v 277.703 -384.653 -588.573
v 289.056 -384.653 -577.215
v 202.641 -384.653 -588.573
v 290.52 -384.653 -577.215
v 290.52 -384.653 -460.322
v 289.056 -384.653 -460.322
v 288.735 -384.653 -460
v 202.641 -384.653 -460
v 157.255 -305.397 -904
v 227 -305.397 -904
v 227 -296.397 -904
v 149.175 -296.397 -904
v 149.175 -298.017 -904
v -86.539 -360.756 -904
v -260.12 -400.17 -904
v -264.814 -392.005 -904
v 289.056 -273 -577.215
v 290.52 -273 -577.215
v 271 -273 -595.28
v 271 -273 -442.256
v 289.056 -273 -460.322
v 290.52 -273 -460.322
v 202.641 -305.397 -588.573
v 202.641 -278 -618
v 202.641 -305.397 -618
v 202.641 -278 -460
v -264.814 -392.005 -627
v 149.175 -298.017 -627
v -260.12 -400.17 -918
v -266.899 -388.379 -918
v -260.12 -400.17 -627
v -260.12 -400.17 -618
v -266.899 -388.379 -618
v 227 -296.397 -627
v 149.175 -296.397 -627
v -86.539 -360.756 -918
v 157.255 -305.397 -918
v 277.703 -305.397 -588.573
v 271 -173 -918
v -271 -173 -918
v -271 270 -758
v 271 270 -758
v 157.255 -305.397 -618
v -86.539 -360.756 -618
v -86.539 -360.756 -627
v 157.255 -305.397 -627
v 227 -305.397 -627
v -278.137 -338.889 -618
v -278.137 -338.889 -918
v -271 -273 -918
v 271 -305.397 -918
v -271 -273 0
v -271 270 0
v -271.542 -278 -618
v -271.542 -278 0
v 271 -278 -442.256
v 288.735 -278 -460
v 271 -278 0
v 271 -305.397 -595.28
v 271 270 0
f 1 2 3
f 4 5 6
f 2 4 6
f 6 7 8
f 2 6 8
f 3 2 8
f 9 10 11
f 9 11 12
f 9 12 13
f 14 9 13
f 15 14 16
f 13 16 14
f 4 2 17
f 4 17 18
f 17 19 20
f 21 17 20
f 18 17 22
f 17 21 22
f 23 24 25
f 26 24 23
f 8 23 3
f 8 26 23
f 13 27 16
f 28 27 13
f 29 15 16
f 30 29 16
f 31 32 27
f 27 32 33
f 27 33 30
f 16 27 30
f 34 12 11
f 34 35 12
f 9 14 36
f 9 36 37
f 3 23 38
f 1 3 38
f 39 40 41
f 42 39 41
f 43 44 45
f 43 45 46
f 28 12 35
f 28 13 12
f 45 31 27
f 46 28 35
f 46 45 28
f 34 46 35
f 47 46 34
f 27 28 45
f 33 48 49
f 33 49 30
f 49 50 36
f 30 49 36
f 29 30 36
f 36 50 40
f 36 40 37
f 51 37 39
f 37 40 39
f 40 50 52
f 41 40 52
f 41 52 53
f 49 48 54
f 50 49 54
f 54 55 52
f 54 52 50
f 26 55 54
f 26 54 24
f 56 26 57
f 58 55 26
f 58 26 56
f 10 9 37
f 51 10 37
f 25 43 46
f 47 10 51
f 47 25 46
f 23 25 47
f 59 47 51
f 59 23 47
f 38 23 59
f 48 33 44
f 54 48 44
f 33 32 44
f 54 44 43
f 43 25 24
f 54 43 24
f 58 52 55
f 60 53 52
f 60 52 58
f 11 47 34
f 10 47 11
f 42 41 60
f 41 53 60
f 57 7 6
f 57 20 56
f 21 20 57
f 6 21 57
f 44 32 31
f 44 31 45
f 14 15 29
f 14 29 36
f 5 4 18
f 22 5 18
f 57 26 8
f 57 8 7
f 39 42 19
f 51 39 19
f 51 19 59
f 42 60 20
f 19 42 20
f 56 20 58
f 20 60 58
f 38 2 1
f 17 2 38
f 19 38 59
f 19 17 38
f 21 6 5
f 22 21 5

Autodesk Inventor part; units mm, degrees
ref_plane "YZ Plane" through (0, 0, 0) normal (1, 0, 0) x (0, 1, 0)
ref_plane "XZ Plane" through (0, 0, 0) normal (0, 1, 0) x (-1, 0, 0)
ref_plane "Work Plane1" through (0, 0, 0) normal (0, 0, 1) x (1, 0, 0)
sketch "Sketch1" plane through (0, 0, 0) normal (0, 0, 1) x (1, 0, 0)
  line L0 (271, 270) -> (271, -270) projected
  line L1 (-271, 270) -> (271, 270) projected
  line L2 (271, -273) -> (271, -270) projected
  line L3 (262.1457, -273) -> (289.056, -273) projected
  line L4 (290.5196, -278) -> (290.5196, -273) projected
  arc A0 (221.5544, -380.4278) -> (259.4491, -380.4278) centre (240.5018, -345.2) ccw
  line L5 (-86.5386, -360.7555) -> (157.2553, -305.3974) projected
  line L6 (-260.1199, -400.1704) -> (-86.5386, -360.7555) projected
  line L7 (-265.6803, -388.102) -> (-276.918, -338.6119) projected
  line L8 (-271, -270) -> (-271, 270) projected
  line L9 (-278.1369, -338.8887) -> (-266.8992, -388.3788) projected
  line L10 (-260.1199, -400.1704) -> (-266.8992, -388.3788)
  line L11 (-266.8992, -388.3788) -> (-278.1369, -338.8887)
  line L12 (-278.1369, -338.8887) -> (-271, -273)
  line L13 (-271, -273) -> (-271, 270)
  line L14 (-271, 270) -> (271, 270)
  line L15 (271, 270) -> (271, -273)
  line L16 (271, -273) -> (290.5196, -273)
  line L17 (290.5196, -273) -> (290.5196, -303.7097)
  line L18 (290.5196, -303.7097) -> (290.5196, -384.6531)
  line L19 (205.5016, -303.2) -> (205.4838, -303.7097) projected
  line L20 (290.5196, -384.6531) -> (202.6414, -384.6531)
  line L21 (202.6414, -305.3974) -> (202.6414, -384.6531)
  line L22 (202.6414, -305.3974) -> (157.2553, -305.3974)
  line L23 (157.2553, -305.3974) -> (-260.1199, -400.1704)
  point P0 (0, 0)
ref_plane "Work Plane2" through (-266.75, -268.75, -918) normal (0, 0, -1) x (0, 1, 0)
extrude "Extrusion1" add sketch "Sketch1" against normal up to surface (918 mm away) contours L0 L2 L3 L16 L4 L17 L18 L20 L21 L22 L5 L6 L10 L9 L12 L13 L8 L1
sketch "Sketch2" plane through (202.6414, -384.6531, 0) normal (-1, 0, 0) x (0, 0, 1)
  line L0 (0, 0) -> (0, 111.6531) projected
  line L1 (0, 79.2557) -> (-918, 79.2557) projected
  line L2 (0, 0) -> (-618, 0)
  line L3 (-618, 0) -> (-618, 79.2557)
  line L4 (-618, 79.2557) -> (0, 79.2557)
  line L5 (0, 79.2557) -> (0, 0)
  line L6 (-623, -15.5173) -> (-623, 23.8976) projected
  line L7 (-918, 79.2557) -> (-918, 0) projected
  line L8 (0, 79.2557) -> (0, 0) projected
  line L9 (0, 0) -> (-618, 0)
  line L10 (-618, 0) -> (-618, -151.7168)
  line L11 (-618, -151.7168) -> (0, -151.7168)
  line L12 (0, -151.7168) -> (0, 0)
  line L13 (0, 111.6531) -> (-918, 111.6531) projected
  line L14 (0, 79.2557) -> (-618, 79.2557)
  line L15 (-618, 79.2557) -> (-618, 106.6531)
  line L16 (-618, 106.6531) -> (0, 106.6531)
  line L17 (0, 106.6531) -> (0, 79.2557)
  point P0 (0, 384.6531)
  point P1 (-618, 0)
  point P2 (0, 106.6531)
  dimension "d2" = 300
  dimension "d5" = 300
  dimension "d18" = 5
extrude "Extrusion2" cut sketch "Sketch2" along normal through all
sketch "Sketch3" plane through (202.6414, -384.6531, 0) normal (0, -1, 0) x (1, 0, 0)
  line L0 (0, -618) -> (0, -918) projected
  line L1 (87.8782, 0) -> (0, 0)
  line L2 (0, 0) -> (0, -460)
  line L3 (0, -460) -> (87.8782, -460)
  line L4 (87.8782, -460) -> (87.8782, 0)
  line L5 (0, -918) -> (87.8782, -918) projected
  line L6 (0, 0) -> (0, -918) projected
  line L7 (87.8782, -918) -> (0, -918)
  line L8 (0, -918) -> (0, -588.5734)
  line L9 (0, -588.5734) -> (87.8782, -588.5734)
  line L10 (87.8782, -588.5734) -> (87.8782, -918)
  point P0 (-202.6414, 0)
  dimension "d8" = 460
extrude "Extrusion3" cut sketch "Sketch3" against normal up to surface (106.6531 mm away) contours L2 L1 L4 L3
sketch "Sketch4" plane through (271, -273, 0) normal (0, 1, 0) x (1, 0, 0)
  line L0 (19.5196, 0) -> (19.5196, 918) projected
  line L1 (-8.8543, 433.3976) -> (18.056, 460.3216) projected
  line L2 (0, 0) -> (0, 918) projected
  line L3 (19.5196, 0) -> (0, 0) projected
  line L4 (18.056, 577.2146) -> (-8.8543, 604.1385) projected
  line L5 (19.5196, 918) -> (0, 918) projected
  line L6 (19.5196, 918) -> (19.5196, 577.2146)
  line L7 (19.5196, 460) -> (19.5196, 918) projected
  line L8 (18.056, 577.2146) -> (19.5196, 577.2146)
  line L9 (18.056, 577.2146) -> (0, 595.2798)
  line L10 (0, 0) -> (0, 918) projected
  line L11 (0, 595.2798) -> (0, 918)
  line L12 (0, 918) -> (19.5196, 918)
  line L13 (18.056, 460.3216) -> (19.5196, 460.3216)
  line L14 (19.5196, 460.3216) -> (19.5196, 0)
  line L15 (19.5196, 0) -> (0, 0)
  line L16 (0, 0) -> (0, 442.2564)
  line L17 (0, 442.2564) -> (18.056, 460.3216)
  point P0 (-271, 0)
  point P1 (19.5196, 588.5734)
  point P2 (19.5196, 577.2146)
  point P3 (0, 595.2798)
extrude "Extrusion4" cut sketch "Sketch4" against normal up to surface (111.6531 mm away) contours L3 L2 L1 L13 L0 | L8 L4 L2 L5 L0
sketch "Sketch5" plane through (-260.1199, -400.1704, -918) normal (0.2214, -0.9752, 0) x (0.9752, 0.2214, 0)
  line L0 (-4, 291) -> (428, 291)
  line L1 (428, 291) -> (428, 14)
  line L2 (428, 14) -> (-4, 14)
  line L3 (-4, 14) -> (-4, 291)
  line L4 (0, 292) -> (178, 292) projected
  line L5 (250, 13) -> (0, 13) projected
  line L6 (-4, 300) -> (-4, 0) projected
  line L7 (428, 300) -> (428, 0) projected
  point P0 (342.2733, 918)
  dimension "d11" = 1
  dimension "d12" = 1
extrude "Extrusion5" cut sketch "Sketch5" against normal blind 9
sketch "Sketch6" plane through (-274.5092, -305.3974, 0) normal (0, -1, 0) x (1, 0, 0)
  line L0 (14.3893, -627) -> (431.7645, -627) projected
  line L1 (423.6845, -627) -> (501.5092, -627)
  line L2 (501.5092, -627) -> (501.5092, -904)
  line L3 (501.5092, -904) -> (423.6845, -904)
  line L4 (423.6845, -904) -> (423.6845, -627)
  line L5 (502.5092, -657) -> (502.5092, -620) projected
  line L6 (502.5092, -911) -> (502.5092, -874) projected
  point P0 (274.5092, 0)
  dimension "d15" = 1
extrude "Extrusion6" cut sketch "Sketch6" against normal blind 9
extrude "Extrusion7" cut sketch "Sketch3" against normal up to surface (79.2557 mm away) contours L6 L9 L10 L5 L0
sketch "Sketch7" plane through (-271, -273, 0) normal (-1, 0, 0) x (0, 0, 1)
  line L0 (-918, 543) -> (-918, 0) projected
  line L1 (-918, 100) -> (-758, 543)
  line L2 (0, 543) -> (-918, 543) projected
  line L3 (-918, 543) -> (-758, 543)
  line L4 (-918, 543) -> (-918, 100)
  point P0 (0, 273)
  dimension "d21" = 100
  dimension "d22" = 160
extrude "Extrusion8" cut sketch "Sketch7" against normal through all
equation "\"d5\" = d2"
equation "\"d12\" = d11"
properties part number "body_collisio"
